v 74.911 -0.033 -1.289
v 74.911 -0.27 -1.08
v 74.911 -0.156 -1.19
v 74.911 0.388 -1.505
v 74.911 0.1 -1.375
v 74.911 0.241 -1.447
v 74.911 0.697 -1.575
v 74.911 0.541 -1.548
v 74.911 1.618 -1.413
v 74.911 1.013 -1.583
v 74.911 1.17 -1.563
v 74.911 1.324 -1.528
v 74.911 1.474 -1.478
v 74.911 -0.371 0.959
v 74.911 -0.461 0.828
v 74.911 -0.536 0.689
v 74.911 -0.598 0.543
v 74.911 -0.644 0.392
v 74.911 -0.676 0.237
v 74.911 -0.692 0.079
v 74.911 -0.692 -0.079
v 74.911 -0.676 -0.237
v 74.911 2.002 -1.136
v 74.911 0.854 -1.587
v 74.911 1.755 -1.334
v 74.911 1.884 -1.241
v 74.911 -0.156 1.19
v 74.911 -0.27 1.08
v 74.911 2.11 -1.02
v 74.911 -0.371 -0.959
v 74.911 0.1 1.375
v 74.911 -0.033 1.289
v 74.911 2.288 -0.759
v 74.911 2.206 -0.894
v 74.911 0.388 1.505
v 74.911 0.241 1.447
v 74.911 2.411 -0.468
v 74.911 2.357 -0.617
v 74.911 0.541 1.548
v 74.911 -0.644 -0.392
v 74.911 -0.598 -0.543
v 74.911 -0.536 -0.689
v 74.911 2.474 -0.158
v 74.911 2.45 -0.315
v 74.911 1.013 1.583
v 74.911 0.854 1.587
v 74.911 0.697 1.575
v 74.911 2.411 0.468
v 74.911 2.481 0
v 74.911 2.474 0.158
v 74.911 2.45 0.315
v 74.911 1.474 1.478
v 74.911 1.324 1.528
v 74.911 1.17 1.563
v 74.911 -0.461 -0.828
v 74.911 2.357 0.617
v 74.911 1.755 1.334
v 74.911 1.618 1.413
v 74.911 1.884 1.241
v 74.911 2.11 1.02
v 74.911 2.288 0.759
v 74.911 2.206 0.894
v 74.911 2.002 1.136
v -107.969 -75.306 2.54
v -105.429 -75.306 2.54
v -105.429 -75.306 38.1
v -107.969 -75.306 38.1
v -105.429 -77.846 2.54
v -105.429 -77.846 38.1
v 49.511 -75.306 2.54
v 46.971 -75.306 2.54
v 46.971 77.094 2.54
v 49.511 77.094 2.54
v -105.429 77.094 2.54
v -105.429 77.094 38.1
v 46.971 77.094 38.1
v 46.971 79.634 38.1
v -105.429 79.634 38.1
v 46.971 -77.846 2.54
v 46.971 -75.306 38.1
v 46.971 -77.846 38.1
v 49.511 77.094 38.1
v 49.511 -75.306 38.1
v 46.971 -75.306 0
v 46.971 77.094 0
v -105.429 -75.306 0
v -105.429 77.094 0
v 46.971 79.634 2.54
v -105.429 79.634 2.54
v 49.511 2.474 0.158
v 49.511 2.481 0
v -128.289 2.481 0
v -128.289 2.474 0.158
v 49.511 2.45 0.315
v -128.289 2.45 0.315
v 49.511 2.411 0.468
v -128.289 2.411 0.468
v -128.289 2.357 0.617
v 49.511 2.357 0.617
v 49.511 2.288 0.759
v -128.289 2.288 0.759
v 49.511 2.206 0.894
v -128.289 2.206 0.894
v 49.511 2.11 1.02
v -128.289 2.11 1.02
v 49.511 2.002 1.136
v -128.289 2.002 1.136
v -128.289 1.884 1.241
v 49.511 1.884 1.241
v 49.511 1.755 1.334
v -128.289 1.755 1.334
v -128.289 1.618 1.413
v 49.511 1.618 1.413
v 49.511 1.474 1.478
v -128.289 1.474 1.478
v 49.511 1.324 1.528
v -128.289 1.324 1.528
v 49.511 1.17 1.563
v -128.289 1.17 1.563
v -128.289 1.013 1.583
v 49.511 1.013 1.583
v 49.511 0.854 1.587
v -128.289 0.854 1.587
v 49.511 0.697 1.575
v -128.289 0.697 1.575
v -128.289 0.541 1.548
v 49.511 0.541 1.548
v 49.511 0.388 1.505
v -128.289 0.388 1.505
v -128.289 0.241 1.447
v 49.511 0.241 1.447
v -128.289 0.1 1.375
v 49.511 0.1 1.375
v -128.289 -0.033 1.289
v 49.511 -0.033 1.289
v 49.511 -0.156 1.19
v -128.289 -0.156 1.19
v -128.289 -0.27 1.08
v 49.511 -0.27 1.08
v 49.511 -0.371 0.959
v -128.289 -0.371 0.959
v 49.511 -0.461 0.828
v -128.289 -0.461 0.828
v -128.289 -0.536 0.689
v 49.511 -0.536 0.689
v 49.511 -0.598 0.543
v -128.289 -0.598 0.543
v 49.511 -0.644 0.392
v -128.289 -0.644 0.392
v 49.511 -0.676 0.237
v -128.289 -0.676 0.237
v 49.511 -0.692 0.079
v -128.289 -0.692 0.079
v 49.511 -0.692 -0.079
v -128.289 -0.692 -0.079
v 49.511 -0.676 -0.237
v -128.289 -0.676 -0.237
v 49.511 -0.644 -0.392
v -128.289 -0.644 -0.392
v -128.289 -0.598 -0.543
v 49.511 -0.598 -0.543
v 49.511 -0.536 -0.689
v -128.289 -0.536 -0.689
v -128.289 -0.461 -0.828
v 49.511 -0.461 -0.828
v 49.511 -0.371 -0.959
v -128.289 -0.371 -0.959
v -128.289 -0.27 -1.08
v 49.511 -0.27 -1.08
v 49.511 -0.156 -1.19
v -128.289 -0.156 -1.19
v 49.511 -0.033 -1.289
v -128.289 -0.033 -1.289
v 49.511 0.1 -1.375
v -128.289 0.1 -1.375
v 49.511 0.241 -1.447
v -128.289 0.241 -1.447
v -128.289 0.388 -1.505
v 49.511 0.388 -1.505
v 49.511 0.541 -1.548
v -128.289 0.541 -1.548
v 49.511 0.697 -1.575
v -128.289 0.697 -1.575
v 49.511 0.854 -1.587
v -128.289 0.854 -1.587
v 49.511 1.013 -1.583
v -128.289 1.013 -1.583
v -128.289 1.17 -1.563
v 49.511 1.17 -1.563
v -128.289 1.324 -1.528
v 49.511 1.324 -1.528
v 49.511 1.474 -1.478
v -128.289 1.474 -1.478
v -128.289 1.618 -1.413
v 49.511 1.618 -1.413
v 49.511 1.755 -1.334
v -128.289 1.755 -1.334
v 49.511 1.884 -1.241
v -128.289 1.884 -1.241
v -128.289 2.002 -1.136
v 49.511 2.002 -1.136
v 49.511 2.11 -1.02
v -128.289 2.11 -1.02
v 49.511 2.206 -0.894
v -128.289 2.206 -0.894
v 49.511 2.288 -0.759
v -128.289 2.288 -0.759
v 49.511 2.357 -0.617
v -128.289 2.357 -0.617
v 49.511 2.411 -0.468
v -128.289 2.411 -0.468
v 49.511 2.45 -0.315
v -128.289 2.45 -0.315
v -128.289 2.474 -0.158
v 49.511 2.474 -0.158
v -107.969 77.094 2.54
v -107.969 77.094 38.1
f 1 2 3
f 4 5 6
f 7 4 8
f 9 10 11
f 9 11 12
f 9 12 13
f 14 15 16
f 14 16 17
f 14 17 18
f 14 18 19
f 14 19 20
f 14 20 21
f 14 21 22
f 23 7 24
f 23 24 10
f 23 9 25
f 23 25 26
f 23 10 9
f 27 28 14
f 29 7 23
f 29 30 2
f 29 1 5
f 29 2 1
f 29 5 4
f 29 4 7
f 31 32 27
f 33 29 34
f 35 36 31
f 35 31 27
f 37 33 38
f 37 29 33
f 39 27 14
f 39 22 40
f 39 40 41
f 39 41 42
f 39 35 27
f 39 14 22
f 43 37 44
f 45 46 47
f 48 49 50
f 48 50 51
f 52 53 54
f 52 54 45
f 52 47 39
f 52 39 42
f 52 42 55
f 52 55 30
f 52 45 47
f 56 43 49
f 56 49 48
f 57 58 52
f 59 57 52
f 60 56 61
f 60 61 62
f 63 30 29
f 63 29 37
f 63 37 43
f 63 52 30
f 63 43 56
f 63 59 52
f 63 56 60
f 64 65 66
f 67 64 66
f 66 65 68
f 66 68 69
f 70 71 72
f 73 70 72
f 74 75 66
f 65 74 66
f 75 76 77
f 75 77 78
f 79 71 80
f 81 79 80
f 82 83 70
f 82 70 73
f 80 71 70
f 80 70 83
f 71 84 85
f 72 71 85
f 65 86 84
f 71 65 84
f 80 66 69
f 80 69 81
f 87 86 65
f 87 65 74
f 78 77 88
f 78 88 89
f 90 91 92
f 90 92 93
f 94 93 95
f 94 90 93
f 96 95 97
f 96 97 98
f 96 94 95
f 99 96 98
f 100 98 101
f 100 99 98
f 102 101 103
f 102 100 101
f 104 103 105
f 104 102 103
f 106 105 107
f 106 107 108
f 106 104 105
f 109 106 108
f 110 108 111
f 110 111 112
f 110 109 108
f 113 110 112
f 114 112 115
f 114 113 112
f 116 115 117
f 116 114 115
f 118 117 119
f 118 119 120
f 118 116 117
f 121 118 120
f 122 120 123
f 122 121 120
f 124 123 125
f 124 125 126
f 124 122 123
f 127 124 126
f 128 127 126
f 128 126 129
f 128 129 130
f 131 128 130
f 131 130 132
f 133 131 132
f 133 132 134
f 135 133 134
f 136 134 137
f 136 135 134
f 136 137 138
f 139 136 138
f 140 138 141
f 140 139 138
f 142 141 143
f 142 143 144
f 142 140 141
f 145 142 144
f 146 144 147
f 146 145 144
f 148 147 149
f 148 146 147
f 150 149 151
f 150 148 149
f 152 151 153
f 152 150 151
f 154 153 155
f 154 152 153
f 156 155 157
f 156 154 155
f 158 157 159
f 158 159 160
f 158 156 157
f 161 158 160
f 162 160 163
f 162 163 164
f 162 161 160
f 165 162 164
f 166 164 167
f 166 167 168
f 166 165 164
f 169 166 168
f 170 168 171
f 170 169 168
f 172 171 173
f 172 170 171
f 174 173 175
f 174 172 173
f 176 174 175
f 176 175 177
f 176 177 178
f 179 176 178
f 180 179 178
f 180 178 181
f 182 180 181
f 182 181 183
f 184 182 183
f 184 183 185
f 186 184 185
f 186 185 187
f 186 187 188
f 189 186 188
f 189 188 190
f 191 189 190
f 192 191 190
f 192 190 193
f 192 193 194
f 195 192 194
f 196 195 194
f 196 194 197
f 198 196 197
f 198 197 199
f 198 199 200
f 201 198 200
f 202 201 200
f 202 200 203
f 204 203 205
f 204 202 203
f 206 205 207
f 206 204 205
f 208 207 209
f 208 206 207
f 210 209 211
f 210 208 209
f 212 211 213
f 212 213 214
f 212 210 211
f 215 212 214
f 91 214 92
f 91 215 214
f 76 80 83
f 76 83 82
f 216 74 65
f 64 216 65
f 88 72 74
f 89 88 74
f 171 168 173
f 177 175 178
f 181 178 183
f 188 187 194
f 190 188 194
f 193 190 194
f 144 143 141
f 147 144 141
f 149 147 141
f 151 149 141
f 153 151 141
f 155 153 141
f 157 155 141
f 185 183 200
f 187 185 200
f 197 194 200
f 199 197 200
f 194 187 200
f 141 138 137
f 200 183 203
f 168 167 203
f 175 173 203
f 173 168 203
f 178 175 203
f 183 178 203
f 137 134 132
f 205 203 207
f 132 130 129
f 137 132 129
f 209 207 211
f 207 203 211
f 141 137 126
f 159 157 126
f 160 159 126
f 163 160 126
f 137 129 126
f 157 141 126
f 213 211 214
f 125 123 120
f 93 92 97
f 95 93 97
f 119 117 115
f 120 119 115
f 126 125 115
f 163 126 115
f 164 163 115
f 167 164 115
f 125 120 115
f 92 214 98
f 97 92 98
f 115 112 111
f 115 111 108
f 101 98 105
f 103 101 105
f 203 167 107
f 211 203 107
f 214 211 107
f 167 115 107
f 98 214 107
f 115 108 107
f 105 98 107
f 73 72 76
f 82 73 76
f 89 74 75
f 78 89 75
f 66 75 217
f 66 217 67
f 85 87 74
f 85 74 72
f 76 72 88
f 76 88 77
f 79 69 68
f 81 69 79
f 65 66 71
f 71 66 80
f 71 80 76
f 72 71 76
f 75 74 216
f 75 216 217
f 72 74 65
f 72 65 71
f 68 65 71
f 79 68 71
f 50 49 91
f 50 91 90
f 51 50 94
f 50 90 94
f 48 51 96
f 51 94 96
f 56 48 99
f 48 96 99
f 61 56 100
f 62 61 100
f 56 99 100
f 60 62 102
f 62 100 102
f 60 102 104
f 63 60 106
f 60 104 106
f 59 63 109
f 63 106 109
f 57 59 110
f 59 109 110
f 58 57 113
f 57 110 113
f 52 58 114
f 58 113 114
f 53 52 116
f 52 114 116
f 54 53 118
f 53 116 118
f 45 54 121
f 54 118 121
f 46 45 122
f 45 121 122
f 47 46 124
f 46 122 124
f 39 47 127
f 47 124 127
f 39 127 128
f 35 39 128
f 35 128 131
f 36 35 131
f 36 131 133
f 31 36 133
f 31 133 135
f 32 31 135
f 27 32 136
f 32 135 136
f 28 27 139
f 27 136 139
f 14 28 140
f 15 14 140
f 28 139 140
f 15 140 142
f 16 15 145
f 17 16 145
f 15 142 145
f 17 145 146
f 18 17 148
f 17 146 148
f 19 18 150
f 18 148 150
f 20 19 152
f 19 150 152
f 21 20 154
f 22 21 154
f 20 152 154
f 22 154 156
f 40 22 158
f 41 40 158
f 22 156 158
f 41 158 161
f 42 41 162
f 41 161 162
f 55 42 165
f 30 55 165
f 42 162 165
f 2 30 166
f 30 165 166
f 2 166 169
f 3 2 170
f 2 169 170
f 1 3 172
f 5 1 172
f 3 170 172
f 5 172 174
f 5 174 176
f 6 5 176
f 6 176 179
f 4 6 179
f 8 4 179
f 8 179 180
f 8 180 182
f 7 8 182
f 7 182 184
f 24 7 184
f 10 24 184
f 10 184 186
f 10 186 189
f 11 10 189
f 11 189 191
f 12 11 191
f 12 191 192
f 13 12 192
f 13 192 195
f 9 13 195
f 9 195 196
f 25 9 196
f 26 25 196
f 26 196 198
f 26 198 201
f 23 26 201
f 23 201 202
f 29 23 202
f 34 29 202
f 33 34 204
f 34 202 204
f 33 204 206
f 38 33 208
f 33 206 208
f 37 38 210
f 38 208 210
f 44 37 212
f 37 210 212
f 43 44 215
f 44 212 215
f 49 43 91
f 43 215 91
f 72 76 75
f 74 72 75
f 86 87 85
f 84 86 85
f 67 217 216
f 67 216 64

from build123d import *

# Parameters (mm, degrees)
F0_W           = 152.4
F0_H           = 152.4
F1_DEPTH       = 2.54
F2_W           = 152.4
F2_H           = 35.56
F3_DEPTH       = 2.54
F4_W           = 152.4
F4_H           = 35.56
F5_DEPTH       = 2.54
F6_W           = 152.4
F6_H           = 35.56
F7_DEPTH       = 2.54
F8_W           = 152.4
F8_H           = 35.56
F9_DEPTH       = 2.54
F10_R          = 1.5875
F11_DEPTH      = 177.8
F11_DEPTH_BACK = 25.4


with BuildPart() as f1:
    # F0 (on Top) → F1 (new body)
    with BuildSketch(Plane.XY):
        with Locations((-29.2293839186, 0.8939653635)):
            Rectangle(F0_W, F0_H)
    extrude(amount=F1_DEPTH)


with BuildPart() as f3:
    # F2 (on face) → F3 (new body)
    with BuildSketch(Plane.XZ.offset(75.3060346365)):
        with Locations((-29.2293839186, 20.32)):
            Rectangle(F2_W, F2_H)
    extrude(amount=F3_DEPTH)


with BuildPart() as f5:
    # F4 (on face) → F5 (new body)
    with BuildSketch(Plane.YZ.offset(46.9706160814)):
        with Locations((0.8939653635, 20.32)):
            Rectangle(F4_W, F4_H)
    extrude(amount=F5_DEPTH)


with BuildPart() as f7:
    # F6 (on face) → F7 (new body)
    with BuildSketch(Plane(origin=(0, 77.0939653635, 0), x_dir=(-1, 0, 0), z_dir=(0, 1, 0))):
        with Locations((29.2293839186, 20.32)):
            Rectangle(F6_W, F6_H)
    extrude(amount=F7_DEPTH)


with BuildPart() as f9:
    # F8 (on face) → F9 (new body)
    with BuildSketch(Plane(origin=(-105.4293839186, 0, 0), x_dir=(0, -1, 0), z_dir=(-1, 0, 0))):
        with Locations((-0.8939653635, 20.32)):
            Rectangle(F8_W, F8_H)
    extrude(amount=F9_DEPTH)


with BuildPart() as f11:
    # F10 (on face) → F11 (new body, two sides)
    with BuildSketch(Plane.YZ.offset(49.5106160814)) as f11_sk:
        with Locations((0.8939653635, 0)):
            Circle(F10_R)
    extrude(amount=-F11_DEPTH)
    extrude(f11_sk.sketch, amount=F11_DEPTH_BACK)


solid = Compound([f1.part, f3.part, f5.part, f7.part, f9.part, f11.part])
